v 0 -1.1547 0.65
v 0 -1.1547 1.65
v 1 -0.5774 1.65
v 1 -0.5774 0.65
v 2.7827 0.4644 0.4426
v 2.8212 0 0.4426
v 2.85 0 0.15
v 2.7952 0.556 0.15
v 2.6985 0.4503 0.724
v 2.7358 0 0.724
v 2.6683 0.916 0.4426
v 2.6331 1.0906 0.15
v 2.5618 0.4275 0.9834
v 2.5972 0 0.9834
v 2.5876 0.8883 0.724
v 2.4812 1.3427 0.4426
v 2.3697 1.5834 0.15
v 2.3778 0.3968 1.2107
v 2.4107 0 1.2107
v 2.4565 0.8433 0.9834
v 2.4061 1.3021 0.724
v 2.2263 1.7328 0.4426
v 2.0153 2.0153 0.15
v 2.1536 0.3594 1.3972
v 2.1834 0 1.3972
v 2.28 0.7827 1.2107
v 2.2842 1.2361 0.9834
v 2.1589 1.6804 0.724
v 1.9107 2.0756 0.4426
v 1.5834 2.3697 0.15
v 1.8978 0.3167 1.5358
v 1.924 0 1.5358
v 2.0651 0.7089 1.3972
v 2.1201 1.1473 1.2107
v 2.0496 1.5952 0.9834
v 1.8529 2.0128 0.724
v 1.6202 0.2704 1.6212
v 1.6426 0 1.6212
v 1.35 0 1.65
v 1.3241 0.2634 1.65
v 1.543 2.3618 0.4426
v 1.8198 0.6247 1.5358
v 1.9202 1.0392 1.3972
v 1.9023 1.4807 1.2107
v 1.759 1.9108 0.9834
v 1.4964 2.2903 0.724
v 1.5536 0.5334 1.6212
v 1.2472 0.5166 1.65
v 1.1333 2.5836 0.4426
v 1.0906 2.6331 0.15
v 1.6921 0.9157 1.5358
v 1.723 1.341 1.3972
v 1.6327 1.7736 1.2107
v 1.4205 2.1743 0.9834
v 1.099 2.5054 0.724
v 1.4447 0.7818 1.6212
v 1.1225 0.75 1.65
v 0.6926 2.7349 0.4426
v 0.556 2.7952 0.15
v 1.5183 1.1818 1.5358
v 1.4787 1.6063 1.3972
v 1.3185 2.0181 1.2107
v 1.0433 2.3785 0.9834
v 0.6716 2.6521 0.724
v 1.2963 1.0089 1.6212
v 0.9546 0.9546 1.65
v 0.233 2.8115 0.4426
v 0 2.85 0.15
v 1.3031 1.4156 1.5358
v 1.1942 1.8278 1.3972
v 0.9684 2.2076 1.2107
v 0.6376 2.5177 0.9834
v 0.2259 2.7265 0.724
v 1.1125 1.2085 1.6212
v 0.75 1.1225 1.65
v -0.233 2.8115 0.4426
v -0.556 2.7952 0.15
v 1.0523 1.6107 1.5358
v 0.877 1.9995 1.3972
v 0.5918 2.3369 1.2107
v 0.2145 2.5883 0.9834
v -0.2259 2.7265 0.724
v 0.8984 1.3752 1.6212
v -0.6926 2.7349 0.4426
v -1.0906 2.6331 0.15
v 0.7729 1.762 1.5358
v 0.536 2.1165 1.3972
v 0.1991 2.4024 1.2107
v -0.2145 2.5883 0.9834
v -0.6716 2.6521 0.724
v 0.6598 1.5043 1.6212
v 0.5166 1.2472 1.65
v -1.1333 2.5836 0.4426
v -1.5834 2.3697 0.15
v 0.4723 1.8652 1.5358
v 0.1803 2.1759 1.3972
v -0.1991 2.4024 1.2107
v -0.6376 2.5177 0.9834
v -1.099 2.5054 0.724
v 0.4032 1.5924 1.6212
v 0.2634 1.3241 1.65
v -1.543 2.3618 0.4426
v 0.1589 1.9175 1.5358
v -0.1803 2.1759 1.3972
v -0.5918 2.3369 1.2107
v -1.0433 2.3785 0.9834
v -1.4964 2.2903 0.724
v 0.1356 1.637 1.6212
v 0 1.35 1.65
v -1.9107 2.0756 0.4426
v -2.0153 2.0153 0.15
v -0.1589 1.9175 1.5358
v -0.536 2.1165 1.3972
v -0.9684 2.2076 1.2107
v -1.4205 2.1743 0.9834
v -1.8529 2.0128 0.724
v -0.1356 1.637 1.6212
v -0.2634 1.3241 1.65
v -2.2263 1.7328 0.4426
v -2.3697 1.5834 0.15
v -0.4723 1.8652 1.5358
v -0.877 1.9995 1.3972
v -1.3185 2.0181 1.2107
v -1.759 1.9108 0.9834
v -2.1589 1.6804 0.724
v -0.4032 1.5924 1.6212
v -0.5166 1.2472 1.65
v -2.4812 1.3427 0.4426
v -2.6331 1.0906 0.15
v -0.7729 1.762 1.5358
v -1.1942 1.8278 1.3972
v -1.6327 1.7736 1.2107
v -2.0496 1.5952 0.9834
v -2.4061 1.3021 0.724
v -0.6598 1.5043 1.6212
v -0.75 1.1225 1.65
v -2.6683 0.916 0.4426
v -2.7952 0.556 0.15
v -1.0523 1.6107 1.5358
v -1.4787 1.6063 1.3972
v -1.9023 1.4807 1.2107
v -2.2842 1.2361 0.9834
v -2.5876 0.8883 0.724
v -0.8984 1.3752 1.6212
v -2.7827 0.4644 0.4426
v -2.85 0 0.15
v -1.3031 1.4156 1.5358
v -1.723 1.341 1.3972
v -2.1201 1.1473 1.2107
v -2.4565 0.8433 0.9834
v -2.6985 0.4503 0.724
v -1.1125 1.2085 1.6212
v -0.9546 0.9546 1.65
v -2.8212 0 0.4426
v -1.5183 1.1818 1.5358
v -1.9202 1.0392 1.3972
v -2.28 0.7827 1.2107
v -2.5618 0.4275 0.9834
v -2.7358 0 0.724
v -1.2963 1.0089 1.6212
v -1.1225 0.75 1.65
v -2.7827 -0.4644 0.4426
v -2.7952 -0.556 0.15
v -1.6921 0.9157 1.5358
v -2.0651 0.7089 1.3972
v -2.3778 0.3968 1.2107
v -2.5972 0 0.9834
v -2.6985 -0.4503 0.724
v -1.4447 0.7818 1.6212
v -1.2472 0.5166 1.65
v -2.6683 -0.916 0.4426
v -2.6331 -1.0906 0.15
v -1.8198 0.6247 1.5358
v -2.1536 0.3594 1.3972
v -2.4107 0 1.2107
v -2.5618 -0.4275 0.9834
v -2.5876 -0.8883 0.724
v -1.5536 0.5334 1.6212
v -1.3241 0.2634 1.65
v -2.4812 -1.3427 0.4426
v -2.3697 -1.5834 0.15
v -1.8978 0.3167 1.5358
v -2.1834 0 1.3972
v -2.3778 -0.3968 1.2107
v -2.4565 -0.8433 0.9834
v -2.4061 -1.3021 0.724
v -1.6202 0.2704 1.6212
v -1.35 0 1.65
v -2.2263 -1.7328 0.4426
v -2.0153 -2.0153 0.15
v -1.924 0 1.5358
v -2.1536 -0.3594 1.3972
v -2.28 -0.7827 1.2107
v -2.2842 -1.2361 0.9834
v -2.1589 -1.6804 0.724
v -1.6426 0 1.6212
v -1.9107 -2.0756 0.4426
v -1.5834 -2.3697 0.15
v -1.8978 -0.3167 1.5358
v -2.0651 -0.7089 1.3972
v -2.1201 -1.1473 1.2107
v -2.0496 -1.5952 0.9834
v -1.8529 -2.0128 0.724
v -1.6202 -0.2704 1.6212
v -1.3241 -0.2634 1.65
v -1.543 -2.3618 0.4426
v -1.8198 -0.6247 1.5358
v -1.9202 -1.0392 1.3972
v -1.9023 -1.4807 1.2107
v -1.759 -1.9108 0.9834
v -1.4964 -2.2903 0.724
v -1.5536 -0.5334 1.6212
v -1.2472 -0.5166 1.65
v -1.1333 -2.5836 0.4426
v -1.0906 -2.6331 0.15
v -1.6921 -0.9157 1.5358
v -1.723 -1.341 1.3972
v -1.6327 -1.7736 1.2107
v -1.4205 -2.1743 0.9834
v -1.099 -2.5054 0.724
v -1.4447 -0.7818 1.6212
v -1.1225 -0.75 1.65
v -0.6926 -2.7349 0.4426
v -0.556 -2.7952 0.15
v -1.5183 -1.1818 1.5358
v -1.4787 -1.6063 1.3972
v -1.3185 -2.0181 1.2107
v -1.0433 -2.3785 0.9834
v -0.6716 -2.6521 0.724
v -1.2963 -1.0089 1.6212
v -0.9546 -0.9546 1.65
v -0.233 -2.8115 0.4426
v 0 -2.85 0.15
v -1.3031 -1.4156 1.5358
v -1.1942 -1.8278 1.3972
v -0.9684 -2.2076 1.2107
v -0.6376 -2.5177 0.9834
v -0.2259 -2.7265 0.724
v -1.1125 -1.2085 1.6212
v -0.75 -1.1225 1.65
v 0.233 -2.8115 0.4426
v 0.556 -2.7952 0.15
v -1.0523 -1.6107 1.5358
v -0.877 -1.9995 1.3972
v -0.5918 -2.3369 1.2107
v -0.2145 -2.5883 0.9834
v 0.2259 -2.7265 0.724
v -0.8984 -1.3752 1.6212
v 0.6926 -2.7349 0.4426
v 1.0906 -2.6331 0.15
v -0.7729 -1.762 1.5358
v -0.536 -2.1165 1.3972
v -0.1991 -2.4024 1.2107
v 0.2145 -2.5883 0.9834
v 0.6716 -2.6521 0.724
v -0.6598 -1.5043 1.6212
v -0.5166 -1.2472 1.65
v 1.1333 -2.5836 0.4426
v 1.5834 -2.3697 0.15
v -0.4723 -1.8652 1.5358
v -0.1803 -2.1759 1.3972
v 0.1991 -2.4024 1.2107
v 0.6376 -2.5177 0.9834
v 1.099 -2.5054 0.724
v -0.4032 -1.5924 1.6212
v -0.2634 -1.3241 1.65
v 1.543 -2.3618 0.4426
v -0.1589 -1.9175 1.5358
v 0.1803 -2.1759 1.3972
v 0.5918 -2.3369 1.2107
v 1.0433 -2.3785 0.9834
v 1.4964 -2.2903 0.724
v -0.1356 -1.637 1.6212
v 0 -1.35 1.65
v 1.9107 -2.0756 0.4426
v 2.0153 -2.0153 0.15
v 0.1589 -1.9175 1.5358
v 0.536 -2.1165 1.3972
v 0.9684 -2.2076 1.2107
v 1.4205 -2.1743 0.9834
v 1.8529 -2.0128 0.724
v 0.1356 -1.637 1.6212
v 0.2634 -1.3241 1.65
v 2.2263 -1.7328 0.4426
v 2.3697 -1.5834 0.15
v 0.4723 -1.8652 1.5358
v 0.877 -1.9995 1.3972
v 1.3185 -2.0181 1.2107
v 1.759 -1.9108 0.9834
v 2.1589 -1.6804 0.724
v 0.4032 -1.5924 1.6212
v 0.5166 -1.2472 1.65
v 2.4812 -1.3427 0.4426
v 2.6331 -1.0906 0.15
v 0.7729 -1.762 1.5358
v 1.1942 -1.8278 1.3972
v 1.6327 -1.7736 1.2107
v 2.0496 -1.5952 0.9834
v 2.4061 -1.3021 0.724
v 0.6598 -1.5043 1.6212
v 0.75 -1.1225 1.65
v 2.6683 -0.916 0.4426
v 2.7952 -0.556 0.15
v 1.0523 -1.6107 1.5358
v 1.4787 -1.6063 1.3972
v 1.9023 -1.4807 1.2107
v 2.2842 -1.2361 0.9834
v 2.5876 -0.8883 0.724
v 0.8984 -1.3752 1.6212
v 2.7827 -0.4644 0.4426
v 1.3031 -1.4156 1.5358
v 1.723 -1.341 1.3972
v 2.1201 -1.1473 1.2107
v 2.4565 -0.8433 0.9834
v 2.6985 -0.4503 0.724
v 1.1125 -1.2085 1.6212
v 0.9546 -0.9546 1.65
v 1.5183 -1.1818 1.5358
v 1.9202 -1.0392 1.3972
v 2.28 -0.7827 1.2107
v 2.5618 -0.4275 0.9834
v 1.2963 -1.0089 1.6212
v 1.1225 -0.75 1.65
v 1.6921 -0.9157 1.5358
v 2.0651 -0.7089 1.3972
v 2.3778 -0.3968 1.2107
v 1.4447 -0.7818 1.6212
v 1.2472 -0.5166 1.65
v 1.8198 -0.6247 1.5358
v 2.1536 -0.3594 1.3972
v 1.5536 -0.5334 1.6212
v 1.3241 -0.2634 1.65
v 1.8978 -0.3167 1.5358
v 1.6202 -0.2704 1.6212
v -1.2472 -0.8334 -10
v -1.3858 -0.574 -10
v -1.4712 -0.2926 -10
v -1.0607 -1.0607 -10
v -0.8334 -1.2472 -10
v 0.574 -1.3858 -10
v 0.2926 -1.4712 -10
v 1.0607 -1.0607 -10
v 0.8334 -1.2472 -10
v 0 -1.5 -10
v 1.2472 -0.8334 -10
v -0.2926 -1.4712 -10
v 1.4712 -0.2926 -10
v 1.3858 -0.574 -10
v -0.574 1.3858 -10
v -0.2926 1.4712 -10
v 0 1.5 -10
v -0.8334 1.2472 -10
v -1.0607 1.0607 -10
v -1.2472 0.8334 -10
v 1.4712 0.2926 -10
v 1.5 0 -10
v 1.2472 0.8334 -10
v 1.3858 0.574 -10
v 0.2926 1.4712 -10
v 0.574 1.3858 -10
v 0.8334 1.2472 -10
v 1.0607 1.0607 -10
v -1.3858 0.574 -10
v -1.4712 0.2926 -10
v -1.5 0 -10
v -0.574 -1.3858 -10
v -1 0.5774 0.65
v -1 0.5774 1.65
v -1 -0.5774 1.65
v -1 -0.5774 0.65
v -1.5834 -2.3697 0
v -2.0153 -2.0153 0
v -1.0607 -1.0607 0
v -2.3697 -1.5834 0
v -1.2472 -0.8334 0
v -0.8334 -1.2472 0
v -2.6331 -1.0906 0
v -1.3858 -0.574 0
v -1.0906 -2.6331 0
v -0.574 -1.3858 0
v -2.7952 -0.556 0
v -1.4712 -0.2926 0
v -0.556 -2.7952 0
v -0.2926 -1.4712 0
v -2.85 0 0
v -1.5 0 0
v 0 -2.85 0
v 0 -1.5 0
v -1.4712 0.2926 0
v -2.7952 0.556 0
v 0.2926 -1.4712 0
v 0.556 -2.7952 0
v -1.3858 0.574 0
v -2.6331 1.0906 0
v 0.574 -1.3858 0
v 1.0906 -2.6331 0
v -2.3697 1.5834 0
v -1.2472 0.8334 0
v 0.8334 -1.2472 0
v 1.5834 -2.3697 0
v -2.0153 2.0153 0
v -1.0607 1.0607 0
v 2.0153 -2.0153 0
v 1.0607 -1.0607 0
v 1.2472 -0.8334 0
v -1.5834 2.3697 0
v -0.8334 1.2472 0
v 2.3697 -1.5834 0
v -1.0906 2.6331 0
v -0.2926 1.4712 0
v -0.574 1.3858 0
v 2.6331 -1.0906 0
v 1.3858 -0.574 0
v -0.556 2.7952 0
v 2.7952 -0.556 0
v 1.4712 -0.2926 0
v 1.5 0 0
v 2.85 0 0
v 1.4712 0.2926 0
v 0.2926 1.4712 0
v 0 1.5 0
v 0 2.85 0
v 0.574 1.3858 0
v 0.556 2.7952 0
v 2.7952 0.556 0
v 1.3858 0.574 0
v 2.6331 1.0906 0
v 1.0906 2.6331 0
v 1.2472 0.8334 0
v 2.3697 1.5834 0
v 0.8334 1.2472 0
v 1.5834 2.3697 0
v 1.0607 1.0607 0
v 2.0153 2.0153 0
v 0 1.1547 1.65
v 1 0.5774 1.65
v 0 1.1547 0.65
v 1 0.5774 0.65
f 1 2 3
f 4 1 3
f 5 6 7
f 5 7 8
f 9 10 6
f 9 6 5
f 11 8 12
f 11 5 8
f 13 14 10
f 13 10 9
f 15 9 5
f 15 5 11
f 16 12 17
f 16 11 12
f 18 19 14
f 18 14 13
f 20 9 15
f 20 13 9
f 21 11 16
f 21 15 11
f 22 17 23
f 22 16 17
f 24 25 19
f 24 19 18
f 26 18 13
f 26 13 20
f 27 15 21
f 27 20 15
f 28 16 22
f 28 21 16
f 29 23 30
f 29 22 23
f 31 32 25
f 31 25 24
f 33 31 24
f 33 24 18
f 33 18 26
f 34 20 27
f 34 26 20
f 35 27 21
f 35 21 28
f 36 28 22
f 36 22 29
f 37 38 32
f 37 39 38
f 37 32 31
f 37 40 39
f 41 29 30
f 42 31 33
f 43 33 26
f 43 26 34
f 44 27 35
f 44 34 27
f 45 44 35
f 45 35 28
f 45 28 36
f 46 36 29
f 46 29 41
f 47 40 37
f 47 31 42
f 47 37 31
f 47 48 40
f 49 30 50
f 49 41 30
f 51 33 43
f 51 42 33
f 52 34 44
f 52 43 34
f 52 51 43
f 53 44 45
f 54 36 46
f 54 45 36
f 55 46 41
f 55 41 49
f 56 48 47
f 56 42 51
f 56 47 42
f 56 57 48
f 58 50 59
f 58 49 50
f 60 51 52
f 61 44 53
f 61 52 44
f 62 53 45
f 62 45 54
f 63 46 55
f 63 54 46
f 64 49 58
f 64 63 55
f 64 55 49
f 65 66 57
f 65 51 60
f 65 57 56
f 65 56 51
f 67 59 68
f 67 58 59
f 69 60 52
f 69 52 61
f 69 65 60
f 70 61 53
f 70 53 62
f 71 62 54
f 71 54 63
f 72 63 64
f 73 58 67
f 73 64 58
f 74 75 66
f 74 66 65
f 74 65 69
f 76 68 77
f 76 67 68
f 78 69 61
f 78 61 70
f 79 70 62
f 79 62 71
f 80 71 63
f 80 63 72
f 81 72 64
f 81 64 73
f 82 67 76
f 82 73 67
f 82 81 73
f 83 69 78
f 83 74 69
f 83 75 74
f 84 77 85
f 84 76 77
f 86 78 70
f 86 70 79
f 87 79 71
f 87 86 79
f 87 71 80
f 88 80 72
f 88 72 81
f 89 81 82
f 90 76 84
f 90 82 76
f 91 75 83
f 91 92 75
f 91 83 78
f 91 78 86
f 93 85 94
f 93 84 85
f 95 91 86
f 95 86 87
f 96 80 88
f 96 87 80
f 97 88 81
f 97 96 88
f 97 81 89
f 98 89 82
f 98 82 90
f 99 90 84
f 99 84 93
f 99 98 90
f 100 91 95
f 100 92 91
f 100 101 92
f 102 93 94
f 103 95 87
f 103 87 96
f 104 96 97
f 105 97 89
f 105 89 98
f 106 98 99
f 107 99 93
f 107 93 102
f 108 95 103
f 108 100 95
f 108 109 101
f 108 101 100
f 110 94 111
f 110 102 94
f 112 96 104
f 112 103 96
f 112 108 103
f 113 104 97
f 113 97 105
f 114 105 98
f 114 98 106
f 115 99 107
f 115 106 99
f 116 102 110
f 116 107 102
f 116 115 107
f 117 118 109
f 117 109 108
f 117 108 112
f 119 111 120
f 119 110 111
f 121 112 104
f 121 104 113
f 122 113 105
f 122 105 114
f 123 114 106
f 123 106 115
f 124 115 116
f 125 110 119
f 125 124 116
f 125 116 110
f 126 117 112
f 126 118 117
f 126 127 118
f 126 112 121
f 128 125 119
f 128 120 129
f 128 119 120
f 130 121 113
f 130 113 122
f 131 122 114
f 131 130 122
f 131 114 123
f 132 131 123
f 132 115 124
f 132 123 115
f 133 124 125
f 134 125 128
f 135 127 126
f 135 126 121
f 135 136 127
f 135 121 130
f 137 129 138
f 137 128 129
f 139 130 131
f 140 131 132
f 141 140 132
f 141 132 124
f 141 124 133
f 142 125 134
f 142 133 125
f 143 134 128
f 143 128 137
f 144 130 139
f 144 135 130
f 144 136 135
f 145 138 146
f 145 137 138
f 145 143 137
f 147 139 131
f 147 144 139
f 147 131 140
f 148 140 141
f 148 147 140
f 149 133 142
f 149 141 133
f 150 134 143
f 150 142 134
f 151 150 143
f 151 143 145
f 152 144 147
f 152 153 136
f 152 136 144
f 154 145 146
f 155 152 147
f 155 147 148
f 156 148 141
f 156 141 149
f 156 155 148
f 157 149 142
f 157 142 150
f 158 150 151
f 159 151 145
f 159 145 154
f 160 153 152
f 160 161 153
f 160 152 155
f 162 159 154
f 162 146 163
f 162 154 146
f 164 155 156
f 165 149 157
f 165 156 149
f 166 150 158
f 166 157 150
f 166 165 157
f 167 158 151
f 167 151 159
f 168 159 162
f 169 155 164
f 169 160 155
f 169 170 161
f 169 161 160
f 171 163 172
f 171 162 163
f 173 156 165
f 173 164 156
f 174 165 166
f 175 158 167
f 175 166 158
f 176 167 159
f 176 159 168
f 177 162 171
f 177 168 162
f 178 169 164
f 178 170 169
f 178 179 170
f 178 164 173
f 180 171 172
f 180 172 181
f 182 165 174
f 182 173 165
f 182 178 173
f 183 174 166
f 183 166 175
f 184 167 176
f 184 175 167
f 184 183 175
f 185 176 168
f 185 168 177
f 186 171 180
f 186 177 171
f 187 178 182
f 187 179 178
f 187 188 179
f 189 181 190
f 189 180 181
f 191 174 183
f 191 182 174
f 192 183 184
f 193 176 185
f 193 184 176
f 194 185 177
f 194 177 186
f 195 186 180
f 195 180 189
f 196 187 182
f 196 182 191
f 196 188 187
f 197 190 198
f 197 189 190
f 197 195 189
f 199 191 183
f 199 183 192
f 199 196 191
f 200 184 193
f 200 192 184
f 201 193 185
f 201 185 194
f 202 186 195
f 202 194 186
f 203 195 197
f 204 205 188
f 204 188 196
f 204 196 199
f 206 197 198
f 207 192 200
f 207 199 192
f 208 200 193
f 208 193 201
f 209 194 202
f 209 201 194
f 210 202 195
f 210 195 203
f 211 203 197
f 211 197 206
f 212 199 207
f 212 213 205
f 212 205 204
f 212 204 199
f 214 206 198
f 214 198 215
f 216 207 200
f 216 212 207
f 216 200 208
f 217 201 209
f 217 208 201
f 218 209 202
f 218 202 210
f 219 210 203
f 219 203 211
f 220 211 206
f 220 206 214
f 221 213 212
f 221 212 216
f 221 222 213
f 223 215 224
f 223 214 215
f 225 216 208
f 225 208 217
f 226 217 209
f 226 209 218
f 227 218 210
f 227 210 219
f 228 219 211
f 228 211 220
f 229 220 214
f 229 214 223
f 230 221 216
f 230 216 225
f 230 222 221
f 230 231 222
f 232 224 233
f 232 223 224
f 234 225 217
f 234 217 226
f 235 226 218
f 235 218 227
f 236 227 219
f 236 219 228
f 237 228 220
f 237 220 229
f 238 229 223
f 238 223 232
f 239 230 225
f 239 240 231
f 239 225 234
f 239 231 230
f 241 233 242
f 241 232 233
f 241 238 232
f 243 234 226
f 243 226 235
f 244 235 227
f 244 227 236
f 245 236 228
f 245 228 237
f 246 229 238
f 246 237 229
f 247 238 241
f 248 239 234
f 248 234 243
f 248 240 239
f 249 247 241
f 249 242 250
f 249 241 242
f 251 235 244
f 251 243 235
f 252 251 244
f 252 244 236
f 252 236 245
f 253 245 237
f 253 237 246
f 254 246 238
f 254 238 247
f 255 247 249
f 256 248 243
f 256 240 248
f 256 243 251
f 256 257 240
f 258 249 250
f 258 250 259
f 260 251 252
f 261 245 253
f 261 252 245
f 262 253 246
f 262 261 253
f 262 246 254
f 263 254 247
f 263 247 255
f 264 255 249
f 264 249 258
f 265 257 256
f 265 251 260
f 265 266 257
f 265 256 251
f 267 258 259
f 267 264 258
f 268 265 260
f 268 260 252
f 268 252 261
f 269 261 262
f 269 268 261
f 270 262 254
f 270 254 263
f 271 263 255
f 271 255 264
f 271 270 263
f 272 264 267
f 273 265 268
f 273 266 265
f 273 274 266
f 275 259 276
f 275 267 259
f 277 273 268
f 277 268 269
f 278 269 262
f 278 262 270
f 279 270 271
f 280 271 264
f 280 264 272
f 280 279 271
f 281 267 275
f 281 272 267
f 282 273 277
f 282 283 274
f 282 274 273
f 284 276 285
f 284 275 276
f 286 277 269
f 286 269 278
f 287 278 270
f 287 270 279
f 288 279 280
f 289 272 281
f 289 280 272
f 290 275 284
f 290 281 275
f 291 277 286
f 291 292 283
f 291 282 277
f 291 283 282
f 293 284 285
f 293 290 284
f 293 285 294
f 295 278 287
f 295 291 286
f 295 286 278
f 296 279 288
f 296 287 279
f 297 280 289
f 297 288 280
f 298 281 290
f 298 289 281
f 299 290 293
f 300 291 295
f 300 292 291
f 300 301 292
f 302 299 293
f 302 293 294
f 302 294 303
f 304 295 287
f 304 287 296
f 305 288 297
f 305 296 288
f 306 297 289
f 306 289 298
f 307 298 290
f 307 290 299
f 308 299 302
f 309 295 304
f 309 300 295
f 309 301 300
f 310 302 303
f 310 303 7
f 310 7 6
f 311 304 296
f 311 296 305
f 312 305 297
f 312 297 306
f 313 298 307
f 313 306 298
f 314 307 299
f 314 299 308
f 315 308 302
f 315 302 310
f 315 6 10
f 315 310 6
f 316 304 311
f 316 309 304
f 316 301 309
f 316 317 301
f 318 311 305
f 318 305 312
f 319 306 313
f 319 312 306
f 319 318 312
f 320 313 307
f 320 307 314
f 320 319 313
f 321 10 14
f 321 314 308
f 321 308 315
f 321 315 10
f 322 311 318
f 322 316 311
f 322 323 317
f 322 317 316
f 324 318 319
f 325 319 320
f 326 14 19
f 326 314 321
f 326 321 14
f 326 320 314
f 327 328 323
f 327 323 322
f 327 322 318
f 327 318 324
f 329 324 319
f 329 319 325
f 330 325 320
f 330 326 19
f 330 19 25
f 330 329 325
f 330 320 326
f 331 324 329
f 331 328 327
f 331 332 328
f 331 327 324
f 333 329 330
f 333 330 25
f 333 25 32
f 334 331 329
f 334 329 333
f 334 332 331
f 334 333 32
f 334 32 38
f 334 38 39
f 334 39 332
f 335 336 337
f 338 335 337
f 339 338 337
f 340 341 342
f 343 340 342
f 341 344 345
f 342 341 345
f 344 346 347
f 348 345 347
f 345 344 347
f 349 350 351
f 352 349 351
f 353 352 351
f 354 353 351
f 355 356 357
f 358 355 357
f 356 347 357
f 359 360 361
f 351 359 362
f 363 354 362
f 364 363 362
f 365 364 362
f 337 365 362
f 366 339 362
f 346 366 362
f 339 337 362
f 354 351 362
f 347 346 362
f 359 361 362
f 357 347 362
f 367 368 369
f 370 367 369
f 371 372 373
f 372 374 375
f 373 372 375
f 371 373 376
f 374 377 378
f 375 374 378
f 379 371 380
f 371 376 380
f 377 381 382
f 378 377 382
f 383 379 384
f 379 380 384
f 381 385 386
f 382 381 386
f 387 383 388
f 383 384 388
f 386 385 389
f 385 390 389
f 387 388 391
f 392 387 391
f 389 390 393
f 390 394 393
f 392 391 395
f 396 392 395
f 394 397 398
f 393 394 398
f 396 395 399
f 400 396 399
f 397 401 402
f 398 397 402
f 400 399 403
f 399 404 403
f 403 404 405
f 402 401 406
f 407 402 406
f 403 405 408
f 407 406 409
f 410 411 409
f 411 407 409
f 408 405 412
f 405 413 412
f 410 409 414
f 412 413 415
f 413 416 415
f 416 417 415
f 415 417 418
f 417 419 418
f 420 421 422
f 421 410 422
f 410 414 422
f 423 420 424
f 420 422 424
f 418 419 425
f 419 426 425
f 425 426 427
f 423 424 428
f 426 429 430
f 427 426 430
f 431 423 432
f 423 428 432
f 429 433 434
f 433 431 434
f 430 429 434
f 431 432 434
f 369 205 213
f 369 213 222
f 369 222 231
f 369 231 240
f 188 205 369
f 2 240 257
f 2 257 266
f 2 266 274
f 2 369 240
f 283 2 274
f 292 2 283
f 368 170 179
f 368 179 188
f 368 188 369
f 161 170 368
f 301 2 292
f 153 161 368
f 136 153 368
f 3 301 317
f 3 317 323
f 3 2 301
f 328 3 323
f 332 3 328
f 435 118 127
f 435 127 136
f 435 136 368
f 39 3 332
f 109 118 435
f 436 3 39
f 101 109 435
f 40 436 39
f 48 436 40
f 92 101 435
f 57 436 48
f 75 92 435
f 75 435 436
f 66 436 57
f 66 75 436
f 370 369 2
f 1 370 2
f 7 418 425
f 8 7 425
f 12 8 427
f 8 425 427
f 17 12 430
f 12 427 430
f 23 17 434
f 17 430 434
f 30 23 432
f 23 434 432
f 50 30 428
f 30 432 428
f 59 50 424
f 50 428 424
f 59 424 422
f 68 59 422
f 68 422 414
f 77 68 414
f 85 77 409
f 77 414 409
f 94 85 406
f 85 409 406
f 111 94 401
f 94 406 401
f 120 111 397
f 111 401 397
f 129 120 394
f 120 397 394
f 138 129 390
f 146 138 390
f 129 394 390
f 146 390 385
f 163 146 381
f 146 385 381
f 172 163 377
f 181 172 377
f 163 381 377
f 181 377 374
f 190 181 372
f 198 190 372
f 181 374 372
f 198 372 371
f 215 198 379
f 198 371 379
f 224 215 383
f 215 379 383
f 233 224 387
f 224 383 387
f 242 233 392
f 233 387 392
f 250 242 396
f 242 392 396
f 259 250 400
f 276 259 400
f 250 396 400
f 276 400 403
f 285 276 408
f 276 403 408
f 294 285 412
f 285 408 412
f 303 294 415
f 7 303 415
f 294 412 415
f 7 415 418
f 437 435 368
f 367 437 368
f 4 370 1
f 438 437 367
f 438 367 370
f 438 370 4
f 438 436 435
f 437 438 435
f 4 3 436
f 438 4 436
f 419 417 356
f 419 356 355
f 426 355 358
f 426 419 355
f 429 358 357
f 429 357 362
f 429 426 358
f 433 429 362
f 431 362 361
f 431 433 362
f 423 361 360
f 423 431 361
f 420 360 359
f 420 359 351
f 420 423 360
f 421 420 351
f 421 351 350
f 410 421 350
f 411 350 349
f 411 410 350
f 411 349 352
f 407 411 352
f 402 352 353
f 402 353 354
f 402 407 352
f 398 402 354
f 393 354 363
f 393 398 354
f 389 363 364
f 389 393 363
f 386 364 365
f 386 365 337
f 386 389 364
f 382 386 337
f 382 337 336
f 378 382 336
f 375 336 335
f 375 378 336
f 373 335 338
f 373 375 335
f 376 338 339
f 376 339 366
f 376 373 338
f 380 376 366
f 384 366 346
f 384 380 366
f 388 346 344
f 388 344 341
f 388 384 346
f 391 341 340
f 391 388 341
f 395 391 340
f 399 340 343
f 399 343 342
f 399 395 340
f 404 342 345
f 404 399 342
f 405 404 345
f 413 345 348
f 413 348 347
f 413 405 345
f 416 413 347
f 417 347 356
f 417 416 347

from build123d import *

# Parameters (mm, degrees)
F0_R      = 1.5
F1_DEPTH  = 10
F0_R_2    = 2.85
F1_FACE_R = 1.5
F2_DEPTH  = 1.65
F4_DEPTH  = 1
F5_R      = 1.5


with BuildPart() as f1:
    # F0 (on Top) → F1 (new body)
    with BuildSketch(Plane.XY):
        Circle(F0_R)
    extrude(amount=-F1_DEPTH)

    # F0 (on Top) + F1_face (on face) → F2 (join)
    with BuildSketch(Plane.XY):
        Circle(F0_R_2)
        Circle(F0_R, mode=Mode.SUBTRACT)
    with BuildSketch(Plane.XY):
        Circle(F1_FACE_R)
    extrude(amount=F2_DEPTH)

    # F3 (on face) → F4 (cut)
    with BuildSketch(Plane.XY.offset(1.65)):
        Polygon((0, 1.1547005384), (-1, 0.5773502692), (-1, -0.5773502692), (0, -1.1547005384), (1, -0.5773502692), (1, 0.5773502692), align=None)
    extrude(amount=-F4_DEPTH, mode=Mode.SUBTRACT)

    # F5
    f5_edges = [f1.edges().sort_by_distance(p)[0] for p in [
        (-2.85, 0, 1.65),
    ]]
    fillet(f5_edges, radius=F5_R)


solid = f1.part
